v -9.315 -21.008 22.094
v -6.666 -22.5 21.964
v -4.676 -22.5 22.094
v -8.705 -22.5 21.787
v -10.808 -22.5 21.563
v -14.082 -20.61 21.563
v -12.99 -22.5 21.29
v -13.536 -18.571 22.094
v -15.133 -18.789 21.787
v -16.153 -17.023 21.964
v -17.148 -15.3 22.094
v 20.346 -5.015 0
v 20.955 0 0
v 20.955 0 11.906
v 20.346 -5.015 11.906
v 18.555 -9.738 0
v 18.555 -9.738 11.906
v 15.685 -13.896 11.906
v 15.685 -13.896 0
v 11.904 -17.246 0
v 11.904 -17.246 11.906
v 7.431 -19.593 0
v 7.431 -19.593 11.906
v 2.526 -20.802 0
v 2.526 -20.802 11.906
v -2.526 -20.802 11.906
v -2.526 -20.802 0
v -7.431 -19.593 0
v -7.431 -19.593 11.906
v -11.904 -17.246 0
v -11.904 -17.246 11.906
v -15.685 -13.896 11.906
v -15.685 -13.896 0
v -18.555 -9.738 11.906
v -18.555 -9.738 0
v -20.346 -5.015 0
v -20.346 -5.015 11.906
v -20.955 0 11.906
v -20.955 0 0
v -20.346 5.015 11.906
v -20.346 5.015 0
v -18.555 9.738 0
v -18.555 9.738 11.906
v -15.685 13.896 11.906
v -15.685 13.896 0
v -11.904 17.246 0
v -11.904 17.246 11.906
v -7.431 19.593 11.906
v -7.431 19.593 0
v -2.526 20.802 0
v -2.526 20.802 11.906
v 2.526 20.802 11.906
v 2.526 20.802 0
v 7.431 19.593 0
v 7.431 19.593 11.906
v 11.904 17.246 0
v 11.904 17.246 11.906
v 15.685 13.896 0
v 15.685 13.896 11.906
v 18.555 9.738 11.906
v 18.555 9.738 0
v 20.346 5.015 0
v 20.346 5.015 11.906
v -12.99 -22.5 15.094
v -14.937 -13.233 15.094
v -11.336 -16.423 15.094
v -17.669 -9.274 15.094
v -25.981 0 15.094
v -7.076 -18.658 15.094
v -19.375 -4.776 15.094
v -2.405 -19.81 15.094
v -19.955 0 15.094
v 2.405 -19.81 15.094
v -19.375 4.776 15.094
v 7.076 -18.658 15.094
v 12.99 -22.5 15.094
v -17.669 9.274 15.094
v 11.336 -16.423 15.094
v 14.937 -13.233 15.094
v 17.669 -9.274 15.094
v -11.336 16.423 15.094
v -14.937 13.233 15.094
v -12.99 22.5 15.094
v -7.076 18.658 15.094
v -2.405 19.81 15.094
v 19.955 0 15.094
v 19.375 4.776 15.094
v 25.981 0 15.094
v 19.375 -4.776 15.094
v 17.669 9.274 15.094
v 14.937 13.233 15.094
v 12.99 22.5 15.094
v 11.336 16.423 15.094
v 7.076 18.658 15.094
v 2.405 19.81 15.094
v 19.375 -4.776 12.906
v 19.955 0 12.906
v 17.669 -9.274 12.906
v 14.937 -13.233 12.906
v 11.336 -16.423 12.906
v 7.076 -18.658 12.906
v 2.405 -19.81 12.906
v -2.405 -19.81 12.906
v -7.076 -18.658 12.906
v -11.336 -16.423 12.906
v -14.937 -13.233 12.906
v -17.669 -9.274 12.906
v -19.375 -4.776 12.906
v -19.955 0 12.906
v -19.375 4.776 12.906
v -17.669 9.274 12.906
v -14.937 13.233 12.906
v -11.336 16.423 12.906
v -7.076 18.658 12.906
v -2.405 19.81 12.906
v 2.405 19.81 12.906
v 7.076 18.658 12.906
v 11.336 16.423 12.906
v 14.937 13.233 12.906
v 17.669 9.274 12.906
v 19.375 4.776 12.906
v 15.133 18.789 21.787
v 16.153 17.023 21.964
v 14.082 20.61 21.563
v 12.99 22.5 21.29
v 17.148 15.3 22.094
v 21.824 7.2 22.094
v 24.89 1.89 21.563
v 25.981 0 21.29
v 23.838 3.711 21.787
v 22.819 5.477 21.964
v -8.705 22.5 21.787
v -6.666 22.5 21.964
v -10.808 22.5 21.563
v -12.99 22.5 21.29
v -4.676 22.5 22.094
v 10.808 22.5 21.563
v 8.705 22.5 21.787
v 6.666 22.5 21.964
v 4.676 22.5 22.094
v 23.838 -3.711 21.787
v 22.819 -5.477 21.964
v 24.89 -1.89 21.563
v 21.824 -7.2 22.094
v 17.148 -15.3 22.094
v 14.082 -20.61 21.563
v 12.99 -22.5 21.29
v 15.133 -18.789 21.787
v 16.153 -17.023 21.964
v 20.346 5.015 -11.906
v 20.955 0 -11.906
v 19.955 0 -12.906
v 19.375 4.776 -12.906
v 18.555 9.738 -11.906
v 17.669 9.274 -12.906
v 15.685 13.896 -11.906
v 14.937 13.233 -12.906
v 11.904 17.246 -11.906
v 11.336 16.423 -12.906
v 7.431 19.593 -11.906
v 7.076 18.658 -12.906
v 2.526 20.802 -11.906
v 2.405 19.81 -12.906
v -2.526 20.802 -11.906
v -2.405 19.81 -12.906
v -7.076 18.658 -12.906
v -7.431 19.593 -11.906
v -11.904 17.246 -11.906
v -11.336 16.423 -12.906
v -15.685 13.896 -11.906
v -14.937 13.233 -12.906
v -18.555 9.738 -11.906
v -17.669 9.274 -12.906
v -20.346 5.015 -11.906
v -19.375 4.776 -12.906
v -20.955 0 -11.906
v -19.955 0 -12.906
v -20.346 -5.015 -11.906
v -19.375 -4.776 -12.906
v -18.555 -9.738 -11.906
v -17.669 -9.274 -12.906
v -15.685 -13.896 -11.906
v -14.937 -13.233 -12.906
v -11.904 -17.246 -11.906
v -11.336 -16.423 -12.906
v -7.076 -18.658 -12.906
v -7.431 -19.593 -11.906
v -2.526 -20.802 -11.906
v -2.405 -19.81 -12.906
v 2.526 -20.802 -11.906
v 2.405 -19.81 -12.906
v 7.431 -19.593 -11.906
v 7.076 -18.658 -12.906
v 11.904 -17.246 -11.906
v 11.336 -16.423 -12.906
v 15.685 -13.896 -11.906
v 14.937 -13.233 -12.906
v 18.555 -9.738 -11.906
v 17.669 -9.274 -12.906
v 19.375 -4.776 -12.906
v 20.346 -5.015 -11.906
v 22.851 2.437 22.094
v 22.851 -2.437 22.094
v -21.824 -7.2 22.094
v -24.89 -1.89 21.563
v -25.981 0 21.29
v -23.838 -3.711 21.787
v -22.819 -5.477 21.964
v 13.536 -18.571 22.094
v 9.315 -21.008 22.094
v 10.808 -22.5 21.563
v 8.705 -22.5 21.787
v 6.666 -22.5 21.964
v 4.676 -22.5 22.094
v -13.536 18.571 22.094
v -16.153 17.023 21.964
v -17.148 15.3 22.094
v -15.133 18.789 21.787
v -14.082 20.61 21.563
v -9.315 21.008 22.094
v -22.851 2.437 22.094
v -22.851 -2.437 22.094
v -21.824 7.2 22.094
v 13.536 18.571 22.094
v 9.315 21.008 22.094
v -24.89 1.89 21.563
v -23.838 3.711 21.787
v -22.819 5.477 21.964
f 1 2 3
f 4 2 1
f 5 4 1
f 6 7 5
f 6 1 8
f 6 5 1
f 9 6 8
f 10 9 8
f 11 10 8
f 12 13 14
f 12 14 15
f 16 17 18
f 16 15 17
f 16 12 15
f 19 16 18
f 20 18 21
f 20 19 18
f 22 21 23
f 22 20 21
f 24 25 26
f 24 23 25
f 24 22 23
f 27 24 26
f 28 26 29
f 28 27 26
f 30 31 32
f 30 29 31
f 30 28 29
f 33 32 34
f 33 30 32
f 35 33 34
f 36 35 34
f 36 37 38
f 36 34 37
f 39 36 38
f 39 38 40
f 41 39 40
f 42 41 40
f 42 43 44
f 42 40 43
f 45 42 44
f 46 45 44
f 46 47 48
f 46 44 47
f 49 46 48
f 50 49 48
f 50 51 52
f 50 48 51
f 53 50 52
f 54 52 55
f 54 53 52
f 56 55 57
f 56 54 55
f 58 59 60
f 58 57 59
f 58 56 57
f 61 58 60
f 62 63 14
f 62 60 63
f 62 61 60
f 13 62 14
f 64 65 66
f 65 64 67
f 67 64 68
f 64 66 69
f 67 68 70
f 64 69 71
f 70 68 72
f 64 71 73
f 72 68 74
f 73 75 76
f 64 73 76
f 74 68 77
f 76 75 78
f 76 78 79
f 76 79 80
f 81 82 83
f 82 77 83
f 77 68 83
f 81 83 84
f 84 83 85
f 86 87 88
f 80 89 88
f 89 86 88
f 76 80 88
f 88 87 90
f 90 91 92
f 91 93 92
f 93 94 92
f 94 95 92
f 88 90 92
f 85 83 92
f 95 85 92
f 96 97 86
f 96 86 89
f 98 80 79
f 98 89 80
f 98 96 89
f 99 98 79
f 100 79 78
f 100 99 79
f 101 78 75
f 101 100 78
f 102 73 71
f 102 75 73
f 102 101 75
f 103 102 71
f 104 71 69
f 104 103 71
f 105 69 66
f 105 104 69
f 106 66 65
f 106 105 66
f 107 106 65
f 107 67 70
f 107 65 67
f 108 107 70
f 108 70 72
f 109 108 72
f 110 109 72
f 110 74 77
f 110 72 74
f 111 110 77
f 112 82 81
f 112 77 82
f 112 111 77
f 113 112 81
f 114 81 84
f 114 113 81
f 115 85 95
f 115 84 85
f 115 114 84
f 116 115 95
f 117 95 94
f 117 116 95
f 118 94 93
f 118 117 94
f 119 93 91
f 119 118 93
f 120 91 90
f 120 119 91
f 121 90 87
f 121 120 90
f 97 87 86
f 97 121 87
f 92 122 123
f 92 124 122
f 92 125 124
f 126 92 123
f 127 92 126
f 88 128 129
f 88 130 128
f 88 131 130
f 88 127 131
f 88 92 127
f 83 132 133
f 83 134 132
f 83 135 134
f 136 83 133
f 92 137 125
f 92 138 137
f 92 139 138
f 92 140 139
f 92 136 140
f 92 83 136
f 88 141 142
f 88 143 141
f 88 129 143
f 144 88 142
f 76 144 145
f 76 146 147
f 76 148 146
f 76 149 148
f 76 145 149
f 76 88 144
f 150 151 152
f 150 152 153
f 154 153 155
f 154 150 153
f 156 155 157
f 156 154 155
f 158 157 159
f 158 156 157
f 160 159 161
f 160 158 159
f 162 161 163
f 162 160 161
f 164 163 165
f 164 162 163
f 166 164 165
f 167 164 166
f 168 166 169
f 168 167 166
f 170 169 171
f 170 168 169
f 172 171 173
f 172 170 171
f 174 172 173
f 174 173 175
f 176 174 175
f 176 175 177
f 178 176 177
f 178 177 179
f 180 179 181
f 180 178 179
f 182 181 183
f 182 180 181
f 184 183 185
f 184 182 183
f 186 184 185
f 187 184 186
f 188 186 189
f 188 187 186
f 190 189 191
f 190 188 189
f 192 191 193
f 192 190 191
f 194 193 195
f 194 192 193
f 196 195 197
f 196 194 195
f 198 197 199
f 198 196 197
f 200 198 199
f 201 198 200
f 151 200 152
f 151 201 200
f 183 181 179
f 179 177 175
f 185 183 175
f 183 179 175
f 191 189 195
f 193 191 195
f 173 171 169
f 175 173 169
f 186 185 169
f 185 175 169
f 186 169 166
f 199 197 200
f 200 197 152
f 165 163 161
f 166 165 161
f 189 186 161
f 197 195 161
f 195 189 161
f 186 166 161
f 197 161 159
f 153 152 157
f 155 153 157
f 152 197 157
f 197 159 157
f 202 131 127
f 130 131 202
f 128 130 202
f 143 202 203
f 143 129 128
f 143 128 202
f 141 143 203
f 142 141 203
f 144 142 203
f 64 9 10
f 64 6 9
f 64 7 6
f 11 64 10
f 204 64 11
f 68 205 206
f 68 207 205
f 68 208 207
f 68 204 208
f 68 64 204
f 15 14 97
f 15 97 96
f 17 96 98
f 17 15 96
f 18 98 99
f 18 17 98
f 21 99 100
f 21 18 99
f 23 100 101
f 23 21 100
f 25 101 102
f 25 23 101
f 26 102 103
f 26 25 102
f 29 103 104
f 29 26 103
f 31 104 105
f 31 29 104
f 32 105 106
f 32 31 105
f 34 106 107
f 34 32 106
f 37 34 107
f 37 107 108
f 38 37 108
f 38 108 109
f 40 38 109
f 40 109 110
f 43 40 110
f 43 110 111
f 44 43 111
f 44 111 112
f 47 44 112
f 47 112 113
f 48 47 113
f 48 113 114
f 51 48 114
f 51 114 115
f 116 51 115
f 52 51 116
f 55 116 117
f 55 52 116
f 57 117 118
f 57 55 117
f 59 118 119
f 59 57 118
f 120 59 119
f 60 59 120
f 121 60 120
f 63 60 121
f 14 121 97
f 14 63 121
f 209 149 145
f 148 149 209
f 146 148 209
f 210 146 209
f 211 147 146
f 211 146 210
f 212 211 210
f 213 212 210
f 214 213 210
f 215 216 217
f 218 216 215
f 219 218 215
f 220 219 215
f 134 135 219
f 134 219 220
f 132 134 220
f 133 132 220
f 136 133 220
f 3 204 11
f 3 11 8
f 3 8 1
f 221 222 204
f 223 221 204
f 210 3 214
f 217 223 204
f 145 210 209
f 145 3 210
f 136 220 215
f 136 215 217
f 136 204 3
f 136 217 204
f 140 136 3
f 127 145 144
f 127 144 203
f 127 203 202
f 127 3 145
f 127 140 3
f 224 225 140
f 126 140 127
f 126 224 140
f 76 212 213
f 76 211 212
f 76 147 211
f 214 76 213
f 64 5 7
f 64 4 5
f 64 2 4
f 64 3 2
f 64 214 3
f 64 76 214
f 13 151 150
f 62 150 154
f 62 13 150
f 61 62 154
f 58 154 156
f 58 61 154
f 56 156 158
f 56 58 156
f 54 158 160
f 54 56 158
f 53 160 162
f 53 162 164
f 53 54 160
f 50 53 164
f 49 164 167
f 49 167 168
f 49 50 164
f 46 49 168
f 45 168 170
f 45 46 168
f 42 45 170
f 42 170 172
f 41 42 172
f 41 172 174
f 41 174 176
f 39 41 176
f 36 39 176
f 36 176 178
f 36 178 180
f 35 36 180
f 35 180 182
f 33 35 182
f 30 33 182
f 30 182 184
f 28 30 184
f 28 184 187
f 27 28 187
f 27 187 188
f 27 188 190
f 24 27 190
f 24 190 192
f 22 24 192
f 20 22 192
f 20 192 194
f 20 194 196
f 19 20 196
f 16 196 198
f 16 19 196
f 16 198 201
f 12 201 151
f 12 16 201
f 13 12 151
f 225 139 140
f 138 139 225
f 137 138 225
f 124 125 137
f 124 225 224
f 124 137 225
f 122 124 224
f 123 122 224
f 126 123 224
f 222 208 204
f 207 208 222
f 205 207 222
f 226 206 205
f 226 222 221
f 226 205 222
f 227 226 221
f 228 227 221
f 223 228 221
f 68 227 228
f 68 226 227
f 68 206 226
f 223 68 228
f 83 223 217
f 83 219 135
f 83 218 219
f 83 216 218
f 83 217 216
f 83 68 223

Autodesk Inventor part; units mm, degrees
ref_plane "YZ Plane" through (0, 0, 0) normal (1, 0, 0) x (0, 1, 0)
ref_plane "XZ Plane" through (0, 0, 0) normal (0, 1, 0) x (-1, 0, 0)
ref_plane "XY Plane" through (0, 0, 0) normal (0, 0, 1) x (1, 0, 0)
sketch "Szkic7" plane through (0, 0, 0) normal (0, 0, 1) x (1, 0, 0)
  circle A0 centre (0, 0) radius 20.955
  dimension "d35" = 41.91
extrude "Wyciągnięcie proste2" add sketch "Szkic7" along normal mid plane 25.8125
chamfer "Faza2" distance 1 angle 45 1 edges at (-20.955, 0, 12.9062)
sketch "Szkic9" plane through (0, 0, 12.9062) normal (0, 0, 1) x (1, 0, 0)
  circle A0 centre (0, 0) radius 19.955 projected
extrude "Wyciągnięcie proste3" add sketch "Szkic9" along normal blind 2.1875
sketch "Szkic10" plane through (0, 0, 15.0938) normal (0, 0, 1) x (1, 0, 0)
  line L0 (-12.9904, 22.5) -> (12.9904, 22.5)
  line L1 (12.9904, 22.5) -> (25.9808, 0)
  line L2 (25.9808, 0) -> (12.9904, -22.5)
  line L3 (12.9904, -22.5) -> (-12.9904, -22.5)
  line L4 (-12.9904, -22.5) -> (-25.9808, 0)
  line L5 (-25.9808, 0) -> (-12.9904, 22.5)
  line L6 (0, 29.337) -> (0, -29.337) construction
  line L7 (-29.337, 0) -> (29.337, 0) construction
  point P0 (0, 0)
  point P1 (0, 0)
  point P2 (0, 22.5)
  dimension "d44" = 45
extrude "Wyciągnięcie proste4" add sketch "Szkic10" along normal blind 7
sketch "Szkic12" plane through (0, 0, 0) normal (0, 1, 0) x (-1, 0, 0)
  line L0 (0, -2.1463) -> (0, 12.8775) construction
  line L1 (-12.9904, 15.0938) -> (-12.9904, 22.0937) construction
  line L2 (-25.9808, 22.0937) -> (-12.9904, 22.0937) construction
  line L3 (-25.9808, 15.0938) -> (-25.9808, 22.0937) projected
  line L4 (-25.9808, 21.2899) -> (-22.9808, 22.0937)
  line L5 (-25.9808, 22.0937) -> (-12.9904, 22.0937) projected
  line L6 (-25.9808, 15.0938) -> (-12.9904, 15.0938) projected
  point P0 (0, 0)
  dimension "d50" = 15
  dimension "d51" = 3
revolve "Obrót2" cut sketch "Szkic12" angle 360 about axis through (0, 0, -10) along (0, 0, 1)
thread "Gwint3" size "G41.91x2.309" designation "G 1 1/4" class "A" standard "ISO Pipe Threads" full length
chamfer "Faza3" distance 1 angle 45 1 edges at (-20.955, 0, -12.9062)
equation "\"d35\" = OD"
equation "\"d36\" = 0.7375 * L"
equation "\"d42\" = 0.0625 * L"
equation "\"d44\" = SW"
equation "\"d45\" = 0.2 * L"
equation "\"d51\" = 0.0666667 * SW"
equation "\"SzerokośćGięciaPodcięcia\" = Grubość"
equation "\"RozmiarPodcięciaNarożnika\" = 4 * Grubość"
equation "\"PromieńPrzejścia\" = PromieńGięcia"
equation "\"Rozmiar_promienia_Jacobiego\" = PromieńGięcia"
equation "\"Wielk_odstępu\" = Grubość"
equation "\"d2\" = PromieńGięcia"
equation "\"d23\" = PromieńGięcia"
equation "\"OD\" = 41.91"
equation "\"SW\" = 45"
equation "\"L\" = 35"
equation "\"Grubość\" = 1.5"
equation "\"PromieńGięcia\" = 3"
properties part number "Korek sześciokątny BSP 1 1/4'' L=35" material "304"
